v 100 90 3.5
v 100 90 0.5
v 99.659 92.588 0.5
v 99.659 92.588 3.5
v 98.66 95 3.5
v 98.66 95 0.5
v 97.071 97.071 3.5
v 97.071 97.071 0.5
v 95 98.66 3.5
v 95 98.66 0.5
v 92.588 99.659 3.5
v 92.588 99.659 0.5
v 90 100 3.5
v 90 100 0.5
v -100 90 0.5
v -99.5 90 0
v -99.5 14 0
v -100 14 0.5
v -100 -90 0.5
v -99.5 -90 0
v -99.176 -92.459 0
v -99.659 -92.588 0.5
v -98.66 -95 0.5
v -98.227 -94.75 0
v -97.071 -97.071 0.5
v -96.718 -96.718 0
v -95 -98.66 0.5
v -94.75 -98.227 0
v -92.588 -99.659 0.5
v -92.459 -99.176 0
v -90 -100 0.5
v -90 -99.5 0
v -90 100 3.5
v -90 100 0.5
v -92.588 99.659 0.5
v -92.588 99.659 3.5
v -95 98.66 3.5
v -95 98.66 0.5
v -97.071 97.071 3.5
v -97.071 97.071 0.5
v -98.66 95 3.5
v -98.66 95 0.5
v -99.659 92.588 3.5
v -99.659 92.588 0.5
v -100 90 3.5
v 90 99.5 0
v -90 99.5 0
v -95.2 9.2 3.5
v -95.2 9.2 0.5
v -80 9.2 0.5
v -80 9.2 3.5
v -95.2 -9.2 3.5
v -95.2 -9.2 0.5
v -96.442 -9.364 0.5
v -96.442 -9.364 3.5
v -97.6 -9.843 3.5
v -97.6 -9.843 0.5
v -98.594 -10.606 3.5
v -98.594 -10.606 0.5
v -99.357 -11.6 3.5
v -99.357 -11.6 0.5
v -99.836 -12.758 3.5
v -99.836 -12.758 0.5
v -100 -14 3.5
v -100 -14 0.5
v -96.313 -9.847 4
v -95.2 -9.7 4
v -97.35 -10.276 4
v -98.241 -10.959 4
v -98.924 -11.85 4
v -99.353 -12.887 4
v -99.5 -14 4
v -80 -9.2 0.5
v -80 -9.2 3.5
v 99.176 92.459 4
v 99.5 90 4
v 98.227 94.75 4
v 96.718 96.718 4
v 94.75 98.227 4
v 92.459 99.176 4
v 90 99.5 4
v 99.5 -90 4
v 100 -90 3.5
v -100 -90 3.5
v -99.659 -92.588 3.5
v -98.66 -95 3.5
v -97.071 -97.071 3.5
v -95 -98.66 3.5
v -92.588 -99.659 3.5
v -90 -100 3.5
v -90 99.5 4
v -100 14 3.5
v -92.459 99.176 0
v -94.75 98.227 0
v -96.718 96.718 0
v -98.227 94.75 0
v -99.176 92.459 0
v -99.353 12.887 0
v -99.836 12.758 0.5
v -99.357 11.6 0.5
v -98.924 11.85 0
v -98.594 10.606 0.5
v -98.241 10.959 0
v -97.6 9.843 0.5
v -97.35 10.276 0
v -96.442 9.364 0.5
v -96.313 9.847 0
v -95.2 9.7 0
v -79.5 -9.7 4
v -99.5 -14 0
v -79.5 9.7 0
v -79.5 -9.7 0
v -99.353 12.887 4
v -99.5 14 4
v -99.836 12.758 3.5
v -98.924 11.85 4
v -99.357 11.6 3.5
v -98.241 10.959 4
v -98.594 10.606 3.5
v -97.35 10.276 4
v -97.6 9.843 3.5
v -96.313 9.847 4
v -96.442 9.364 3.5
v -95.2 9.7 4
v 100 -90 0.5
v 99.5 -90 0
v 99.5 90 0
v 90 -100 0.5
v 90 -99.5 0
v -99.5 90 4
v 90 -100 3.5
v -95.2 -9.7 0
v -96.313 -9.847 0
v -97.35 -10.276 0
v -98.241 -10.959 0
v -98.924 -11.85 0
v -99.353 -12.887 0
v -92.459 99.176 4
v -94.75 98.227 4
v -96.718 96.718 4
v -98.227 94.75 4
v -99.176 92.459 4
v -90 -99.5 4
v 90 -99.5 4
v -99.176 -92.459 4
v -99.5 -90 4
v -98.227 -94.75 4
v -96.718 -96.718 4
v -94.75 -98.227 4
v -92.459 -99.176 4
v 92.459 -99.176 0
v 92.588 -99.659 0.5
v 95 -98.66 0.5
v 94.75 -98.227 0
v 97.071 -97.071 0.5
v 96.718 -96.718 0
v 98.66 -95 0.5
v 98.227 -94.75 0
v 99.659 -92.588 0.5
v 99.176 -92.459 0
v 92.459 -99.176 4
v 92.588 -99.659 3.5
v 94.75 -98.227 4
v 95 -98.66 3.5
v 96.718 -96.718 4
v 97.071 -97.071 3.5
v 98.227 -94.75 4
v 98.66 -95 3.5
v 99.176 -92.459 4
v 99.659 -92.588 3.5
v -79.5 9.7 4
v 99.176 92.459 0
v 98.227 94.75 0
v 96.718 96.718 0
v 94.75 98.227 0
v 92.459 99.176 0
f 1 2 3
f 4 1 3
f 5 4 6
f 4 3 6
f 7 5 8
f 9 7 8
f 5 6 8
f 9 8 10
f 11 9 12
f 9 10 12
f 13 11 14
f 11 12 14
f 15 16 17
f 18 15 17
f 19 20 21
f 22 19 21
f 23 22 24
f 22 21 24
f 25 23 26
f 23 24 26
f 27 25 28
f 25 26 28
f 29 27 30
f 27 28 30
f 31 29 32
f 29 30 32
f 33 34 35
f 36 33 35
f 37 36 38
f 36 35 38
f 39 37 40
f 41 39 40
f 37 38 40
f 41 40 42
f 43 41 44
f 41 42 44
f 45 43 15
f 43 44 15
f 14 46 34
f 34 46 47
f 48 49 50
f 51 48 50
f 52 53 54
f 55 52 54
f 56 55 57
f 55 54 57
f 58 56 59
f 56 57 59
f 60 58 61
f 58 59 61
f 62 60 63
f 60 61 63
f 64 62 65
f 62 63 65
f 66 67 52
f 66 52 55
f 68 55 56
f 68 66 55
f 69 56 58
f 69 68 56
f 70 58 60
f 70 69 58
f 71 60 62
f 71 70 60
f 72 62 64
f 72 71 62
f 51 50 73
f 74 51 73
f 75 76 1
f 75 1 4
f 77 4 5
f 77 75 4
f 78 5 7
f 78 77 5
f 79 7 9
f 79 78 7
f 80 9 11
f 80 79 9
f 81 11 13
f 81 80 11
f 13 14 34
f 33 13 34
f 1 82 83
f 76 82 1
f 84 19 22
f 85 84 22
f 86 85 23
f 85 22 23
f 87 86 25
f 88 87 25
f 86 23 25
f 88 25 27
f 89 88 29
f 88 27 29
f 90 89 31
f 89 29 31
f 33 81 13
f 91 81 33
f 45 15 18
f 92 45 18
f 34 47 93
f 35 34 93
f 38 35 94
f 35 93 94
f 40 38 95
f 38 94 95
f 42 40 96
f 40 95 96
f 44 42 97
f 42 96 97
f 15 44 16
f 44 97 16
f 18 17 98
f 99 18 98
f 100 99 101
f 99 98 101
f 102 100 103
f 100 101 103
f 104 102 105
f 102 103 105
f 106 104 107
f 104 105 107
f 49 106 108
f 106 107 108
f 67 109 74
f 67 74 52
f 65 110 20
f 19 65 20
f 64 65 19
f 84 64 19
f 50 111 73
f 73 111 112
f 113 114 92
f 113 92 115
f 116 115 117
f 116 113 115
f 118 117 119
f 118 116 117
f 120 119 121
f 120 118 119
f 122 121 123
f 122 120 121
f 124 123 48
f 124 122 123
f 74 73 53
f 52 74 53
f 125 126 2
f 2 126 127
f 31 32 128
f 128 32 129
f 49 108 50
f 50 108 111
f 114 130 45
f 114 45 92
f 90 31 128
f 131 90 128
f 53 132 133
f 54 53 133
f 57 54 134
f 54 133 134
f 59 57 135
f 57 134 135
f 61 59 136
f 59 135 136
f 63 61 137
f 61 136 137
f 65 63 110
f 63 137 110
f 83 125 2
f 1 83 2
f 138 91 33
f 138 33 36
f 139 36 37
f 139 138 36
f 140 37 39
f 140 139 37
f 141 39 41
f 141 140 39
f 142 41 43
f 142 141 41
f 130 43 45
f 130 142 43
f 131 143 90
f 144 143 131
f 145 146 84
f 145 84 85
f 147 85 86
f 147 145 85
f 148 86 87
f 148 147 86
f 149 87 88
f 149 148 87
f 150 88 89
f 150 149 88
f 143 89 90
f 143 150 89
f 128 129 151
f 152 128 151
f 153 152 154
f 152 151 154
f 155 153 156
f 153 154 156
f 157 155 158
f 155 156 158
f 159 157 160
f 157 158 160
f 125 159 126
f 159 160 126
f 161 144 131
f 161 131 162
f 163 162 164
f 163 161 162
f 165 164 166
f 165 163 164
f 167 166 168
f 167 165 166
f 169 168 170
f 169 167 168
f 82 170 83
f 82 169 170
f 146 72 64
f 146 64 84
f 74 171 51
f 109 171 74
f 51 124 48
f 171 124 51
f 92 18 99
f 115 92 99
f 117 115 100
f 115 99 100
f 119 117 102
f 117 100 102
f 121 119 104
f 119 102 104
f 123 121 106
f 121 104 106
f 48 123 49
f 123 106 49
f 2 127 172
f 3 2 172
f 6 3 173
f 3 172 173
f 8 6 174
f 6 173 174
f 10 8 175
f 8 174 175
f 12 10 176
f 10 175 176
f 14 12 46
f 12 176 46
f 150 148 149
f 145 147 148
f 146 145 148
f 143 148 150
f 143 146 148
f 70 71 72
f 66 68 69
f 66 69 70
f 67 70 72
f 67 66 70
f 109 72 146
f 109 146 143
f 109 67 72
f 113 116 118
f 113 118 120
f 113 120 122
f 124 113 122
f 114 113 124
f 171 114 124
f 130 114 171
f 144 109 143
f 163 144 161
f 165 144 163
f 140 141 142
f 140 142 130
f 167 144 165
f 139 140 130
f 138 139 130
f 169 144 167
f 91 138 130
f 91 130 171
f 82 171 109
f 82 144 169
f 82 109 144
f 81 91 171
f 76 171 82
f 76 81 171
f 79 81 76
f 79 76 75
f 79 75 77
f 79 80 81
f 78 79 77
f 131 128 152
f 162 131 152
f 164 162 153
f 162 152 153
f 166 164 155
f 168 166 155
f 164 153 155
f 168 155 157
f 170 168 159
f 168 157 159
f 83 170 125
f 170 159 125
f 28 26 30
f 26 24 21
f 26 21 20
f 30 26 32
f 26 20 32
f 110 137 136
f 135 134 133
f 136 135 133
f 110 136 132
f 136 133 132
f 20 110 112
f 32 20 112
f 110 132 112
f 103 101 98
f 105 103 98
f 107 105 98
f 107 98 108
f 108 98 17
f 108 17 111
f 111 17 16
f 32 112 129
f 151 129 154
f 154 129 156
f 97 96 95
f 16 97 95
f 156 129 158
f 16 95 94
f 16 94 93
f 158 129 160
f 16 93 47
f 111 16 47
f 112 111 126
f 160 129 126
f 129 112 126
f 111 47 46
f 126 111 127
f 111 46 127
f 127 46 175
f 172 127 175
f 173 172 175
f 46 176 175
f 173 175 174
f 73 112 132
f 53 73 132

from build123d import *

# Parameters (mm, degrees)
F1_DEPTH = 4
F2_SIZE  = 0.5


with BuildPart() as f1:
    # F0 (on Top) → F1 (new body)
    with BuildSketch(Plane.XY):
        with BuildLine():
            Line((-90, -100), (90, -100))
            ThreePointArc((90, -100), (97.071068, -97.071068), (100, -90))
            Line((100, -90), (100, 90))
            ThreePointArc((100, 90), (97.071068, 97.071068), (90, 100))
            Line((90, 100), (-90, 100))
            ThreePointArc((-90, 100), (-97.071068, 97.071068), (-100, 90))
            Line((-100, 90), (-100, 14))
            ThreePointArc((-100, 14), (-98.594113, 10.605887), (-95.2, 9.2))
            Line((-95.2, 9.2), (-80, 9.2))
            Line((-80, 9.2), (-80, -9.2))
            Line((-80, -9.2), (-95.2, -9.2))
            ThreePointArc((-95.2, -9.2), (-98.594113, -10.605887), (-100, -14))
            Line((-100, -14), (-100, -90))
            ThreePointArc((-100, -90), (-97.071068, -97.071068), (-90, -100))
        make_face()
    extrude(amount=F1_DEPTH)

    # F2
    f2_edges = [f1.edges().sort_by_distance(p)[0] for p in [
        (0, -100, 4),
        (97.071068, -97.071068, 4),
        (100, 0, 4),
        (97.071068, 97.071068, 4),
        (0, 100, 4),
        (-97.071068, 97.071068, 4),
        (-100, 52, 4),
        (-98.594113, 10.605887, 4),
        (-87.6, 9.2, 4),
        (-80, 0, 4),
        (-87.6, -9.2, 4),
        (-98.594113, -10.605887, 4),
        (-100, -52, 4),
        (-97.071068, -97.071068, 4),
        (0, -100, 0),
        (97.071068, -97.071068, 0),
        (100, 0, 0),
        (97.071068, 97.071068, 0),
        (0, 100, 0),
        (-97.071068, 97.071068, 0),
        (-100, 52, 0),
        (-98.594113, 10.605887, 0),
        (-87.6, 9.2, 0),
        (-80, 0, 0),
        (-87.6, -9.2, 0),
        (-98.594113, -10.605887, 0),
        (-100, -52, 0),
        (-97.071068, -97.071068, 0),
    ]]
    chamfer(f2_edges, length=F2_SIZE)


solid = f1.part
